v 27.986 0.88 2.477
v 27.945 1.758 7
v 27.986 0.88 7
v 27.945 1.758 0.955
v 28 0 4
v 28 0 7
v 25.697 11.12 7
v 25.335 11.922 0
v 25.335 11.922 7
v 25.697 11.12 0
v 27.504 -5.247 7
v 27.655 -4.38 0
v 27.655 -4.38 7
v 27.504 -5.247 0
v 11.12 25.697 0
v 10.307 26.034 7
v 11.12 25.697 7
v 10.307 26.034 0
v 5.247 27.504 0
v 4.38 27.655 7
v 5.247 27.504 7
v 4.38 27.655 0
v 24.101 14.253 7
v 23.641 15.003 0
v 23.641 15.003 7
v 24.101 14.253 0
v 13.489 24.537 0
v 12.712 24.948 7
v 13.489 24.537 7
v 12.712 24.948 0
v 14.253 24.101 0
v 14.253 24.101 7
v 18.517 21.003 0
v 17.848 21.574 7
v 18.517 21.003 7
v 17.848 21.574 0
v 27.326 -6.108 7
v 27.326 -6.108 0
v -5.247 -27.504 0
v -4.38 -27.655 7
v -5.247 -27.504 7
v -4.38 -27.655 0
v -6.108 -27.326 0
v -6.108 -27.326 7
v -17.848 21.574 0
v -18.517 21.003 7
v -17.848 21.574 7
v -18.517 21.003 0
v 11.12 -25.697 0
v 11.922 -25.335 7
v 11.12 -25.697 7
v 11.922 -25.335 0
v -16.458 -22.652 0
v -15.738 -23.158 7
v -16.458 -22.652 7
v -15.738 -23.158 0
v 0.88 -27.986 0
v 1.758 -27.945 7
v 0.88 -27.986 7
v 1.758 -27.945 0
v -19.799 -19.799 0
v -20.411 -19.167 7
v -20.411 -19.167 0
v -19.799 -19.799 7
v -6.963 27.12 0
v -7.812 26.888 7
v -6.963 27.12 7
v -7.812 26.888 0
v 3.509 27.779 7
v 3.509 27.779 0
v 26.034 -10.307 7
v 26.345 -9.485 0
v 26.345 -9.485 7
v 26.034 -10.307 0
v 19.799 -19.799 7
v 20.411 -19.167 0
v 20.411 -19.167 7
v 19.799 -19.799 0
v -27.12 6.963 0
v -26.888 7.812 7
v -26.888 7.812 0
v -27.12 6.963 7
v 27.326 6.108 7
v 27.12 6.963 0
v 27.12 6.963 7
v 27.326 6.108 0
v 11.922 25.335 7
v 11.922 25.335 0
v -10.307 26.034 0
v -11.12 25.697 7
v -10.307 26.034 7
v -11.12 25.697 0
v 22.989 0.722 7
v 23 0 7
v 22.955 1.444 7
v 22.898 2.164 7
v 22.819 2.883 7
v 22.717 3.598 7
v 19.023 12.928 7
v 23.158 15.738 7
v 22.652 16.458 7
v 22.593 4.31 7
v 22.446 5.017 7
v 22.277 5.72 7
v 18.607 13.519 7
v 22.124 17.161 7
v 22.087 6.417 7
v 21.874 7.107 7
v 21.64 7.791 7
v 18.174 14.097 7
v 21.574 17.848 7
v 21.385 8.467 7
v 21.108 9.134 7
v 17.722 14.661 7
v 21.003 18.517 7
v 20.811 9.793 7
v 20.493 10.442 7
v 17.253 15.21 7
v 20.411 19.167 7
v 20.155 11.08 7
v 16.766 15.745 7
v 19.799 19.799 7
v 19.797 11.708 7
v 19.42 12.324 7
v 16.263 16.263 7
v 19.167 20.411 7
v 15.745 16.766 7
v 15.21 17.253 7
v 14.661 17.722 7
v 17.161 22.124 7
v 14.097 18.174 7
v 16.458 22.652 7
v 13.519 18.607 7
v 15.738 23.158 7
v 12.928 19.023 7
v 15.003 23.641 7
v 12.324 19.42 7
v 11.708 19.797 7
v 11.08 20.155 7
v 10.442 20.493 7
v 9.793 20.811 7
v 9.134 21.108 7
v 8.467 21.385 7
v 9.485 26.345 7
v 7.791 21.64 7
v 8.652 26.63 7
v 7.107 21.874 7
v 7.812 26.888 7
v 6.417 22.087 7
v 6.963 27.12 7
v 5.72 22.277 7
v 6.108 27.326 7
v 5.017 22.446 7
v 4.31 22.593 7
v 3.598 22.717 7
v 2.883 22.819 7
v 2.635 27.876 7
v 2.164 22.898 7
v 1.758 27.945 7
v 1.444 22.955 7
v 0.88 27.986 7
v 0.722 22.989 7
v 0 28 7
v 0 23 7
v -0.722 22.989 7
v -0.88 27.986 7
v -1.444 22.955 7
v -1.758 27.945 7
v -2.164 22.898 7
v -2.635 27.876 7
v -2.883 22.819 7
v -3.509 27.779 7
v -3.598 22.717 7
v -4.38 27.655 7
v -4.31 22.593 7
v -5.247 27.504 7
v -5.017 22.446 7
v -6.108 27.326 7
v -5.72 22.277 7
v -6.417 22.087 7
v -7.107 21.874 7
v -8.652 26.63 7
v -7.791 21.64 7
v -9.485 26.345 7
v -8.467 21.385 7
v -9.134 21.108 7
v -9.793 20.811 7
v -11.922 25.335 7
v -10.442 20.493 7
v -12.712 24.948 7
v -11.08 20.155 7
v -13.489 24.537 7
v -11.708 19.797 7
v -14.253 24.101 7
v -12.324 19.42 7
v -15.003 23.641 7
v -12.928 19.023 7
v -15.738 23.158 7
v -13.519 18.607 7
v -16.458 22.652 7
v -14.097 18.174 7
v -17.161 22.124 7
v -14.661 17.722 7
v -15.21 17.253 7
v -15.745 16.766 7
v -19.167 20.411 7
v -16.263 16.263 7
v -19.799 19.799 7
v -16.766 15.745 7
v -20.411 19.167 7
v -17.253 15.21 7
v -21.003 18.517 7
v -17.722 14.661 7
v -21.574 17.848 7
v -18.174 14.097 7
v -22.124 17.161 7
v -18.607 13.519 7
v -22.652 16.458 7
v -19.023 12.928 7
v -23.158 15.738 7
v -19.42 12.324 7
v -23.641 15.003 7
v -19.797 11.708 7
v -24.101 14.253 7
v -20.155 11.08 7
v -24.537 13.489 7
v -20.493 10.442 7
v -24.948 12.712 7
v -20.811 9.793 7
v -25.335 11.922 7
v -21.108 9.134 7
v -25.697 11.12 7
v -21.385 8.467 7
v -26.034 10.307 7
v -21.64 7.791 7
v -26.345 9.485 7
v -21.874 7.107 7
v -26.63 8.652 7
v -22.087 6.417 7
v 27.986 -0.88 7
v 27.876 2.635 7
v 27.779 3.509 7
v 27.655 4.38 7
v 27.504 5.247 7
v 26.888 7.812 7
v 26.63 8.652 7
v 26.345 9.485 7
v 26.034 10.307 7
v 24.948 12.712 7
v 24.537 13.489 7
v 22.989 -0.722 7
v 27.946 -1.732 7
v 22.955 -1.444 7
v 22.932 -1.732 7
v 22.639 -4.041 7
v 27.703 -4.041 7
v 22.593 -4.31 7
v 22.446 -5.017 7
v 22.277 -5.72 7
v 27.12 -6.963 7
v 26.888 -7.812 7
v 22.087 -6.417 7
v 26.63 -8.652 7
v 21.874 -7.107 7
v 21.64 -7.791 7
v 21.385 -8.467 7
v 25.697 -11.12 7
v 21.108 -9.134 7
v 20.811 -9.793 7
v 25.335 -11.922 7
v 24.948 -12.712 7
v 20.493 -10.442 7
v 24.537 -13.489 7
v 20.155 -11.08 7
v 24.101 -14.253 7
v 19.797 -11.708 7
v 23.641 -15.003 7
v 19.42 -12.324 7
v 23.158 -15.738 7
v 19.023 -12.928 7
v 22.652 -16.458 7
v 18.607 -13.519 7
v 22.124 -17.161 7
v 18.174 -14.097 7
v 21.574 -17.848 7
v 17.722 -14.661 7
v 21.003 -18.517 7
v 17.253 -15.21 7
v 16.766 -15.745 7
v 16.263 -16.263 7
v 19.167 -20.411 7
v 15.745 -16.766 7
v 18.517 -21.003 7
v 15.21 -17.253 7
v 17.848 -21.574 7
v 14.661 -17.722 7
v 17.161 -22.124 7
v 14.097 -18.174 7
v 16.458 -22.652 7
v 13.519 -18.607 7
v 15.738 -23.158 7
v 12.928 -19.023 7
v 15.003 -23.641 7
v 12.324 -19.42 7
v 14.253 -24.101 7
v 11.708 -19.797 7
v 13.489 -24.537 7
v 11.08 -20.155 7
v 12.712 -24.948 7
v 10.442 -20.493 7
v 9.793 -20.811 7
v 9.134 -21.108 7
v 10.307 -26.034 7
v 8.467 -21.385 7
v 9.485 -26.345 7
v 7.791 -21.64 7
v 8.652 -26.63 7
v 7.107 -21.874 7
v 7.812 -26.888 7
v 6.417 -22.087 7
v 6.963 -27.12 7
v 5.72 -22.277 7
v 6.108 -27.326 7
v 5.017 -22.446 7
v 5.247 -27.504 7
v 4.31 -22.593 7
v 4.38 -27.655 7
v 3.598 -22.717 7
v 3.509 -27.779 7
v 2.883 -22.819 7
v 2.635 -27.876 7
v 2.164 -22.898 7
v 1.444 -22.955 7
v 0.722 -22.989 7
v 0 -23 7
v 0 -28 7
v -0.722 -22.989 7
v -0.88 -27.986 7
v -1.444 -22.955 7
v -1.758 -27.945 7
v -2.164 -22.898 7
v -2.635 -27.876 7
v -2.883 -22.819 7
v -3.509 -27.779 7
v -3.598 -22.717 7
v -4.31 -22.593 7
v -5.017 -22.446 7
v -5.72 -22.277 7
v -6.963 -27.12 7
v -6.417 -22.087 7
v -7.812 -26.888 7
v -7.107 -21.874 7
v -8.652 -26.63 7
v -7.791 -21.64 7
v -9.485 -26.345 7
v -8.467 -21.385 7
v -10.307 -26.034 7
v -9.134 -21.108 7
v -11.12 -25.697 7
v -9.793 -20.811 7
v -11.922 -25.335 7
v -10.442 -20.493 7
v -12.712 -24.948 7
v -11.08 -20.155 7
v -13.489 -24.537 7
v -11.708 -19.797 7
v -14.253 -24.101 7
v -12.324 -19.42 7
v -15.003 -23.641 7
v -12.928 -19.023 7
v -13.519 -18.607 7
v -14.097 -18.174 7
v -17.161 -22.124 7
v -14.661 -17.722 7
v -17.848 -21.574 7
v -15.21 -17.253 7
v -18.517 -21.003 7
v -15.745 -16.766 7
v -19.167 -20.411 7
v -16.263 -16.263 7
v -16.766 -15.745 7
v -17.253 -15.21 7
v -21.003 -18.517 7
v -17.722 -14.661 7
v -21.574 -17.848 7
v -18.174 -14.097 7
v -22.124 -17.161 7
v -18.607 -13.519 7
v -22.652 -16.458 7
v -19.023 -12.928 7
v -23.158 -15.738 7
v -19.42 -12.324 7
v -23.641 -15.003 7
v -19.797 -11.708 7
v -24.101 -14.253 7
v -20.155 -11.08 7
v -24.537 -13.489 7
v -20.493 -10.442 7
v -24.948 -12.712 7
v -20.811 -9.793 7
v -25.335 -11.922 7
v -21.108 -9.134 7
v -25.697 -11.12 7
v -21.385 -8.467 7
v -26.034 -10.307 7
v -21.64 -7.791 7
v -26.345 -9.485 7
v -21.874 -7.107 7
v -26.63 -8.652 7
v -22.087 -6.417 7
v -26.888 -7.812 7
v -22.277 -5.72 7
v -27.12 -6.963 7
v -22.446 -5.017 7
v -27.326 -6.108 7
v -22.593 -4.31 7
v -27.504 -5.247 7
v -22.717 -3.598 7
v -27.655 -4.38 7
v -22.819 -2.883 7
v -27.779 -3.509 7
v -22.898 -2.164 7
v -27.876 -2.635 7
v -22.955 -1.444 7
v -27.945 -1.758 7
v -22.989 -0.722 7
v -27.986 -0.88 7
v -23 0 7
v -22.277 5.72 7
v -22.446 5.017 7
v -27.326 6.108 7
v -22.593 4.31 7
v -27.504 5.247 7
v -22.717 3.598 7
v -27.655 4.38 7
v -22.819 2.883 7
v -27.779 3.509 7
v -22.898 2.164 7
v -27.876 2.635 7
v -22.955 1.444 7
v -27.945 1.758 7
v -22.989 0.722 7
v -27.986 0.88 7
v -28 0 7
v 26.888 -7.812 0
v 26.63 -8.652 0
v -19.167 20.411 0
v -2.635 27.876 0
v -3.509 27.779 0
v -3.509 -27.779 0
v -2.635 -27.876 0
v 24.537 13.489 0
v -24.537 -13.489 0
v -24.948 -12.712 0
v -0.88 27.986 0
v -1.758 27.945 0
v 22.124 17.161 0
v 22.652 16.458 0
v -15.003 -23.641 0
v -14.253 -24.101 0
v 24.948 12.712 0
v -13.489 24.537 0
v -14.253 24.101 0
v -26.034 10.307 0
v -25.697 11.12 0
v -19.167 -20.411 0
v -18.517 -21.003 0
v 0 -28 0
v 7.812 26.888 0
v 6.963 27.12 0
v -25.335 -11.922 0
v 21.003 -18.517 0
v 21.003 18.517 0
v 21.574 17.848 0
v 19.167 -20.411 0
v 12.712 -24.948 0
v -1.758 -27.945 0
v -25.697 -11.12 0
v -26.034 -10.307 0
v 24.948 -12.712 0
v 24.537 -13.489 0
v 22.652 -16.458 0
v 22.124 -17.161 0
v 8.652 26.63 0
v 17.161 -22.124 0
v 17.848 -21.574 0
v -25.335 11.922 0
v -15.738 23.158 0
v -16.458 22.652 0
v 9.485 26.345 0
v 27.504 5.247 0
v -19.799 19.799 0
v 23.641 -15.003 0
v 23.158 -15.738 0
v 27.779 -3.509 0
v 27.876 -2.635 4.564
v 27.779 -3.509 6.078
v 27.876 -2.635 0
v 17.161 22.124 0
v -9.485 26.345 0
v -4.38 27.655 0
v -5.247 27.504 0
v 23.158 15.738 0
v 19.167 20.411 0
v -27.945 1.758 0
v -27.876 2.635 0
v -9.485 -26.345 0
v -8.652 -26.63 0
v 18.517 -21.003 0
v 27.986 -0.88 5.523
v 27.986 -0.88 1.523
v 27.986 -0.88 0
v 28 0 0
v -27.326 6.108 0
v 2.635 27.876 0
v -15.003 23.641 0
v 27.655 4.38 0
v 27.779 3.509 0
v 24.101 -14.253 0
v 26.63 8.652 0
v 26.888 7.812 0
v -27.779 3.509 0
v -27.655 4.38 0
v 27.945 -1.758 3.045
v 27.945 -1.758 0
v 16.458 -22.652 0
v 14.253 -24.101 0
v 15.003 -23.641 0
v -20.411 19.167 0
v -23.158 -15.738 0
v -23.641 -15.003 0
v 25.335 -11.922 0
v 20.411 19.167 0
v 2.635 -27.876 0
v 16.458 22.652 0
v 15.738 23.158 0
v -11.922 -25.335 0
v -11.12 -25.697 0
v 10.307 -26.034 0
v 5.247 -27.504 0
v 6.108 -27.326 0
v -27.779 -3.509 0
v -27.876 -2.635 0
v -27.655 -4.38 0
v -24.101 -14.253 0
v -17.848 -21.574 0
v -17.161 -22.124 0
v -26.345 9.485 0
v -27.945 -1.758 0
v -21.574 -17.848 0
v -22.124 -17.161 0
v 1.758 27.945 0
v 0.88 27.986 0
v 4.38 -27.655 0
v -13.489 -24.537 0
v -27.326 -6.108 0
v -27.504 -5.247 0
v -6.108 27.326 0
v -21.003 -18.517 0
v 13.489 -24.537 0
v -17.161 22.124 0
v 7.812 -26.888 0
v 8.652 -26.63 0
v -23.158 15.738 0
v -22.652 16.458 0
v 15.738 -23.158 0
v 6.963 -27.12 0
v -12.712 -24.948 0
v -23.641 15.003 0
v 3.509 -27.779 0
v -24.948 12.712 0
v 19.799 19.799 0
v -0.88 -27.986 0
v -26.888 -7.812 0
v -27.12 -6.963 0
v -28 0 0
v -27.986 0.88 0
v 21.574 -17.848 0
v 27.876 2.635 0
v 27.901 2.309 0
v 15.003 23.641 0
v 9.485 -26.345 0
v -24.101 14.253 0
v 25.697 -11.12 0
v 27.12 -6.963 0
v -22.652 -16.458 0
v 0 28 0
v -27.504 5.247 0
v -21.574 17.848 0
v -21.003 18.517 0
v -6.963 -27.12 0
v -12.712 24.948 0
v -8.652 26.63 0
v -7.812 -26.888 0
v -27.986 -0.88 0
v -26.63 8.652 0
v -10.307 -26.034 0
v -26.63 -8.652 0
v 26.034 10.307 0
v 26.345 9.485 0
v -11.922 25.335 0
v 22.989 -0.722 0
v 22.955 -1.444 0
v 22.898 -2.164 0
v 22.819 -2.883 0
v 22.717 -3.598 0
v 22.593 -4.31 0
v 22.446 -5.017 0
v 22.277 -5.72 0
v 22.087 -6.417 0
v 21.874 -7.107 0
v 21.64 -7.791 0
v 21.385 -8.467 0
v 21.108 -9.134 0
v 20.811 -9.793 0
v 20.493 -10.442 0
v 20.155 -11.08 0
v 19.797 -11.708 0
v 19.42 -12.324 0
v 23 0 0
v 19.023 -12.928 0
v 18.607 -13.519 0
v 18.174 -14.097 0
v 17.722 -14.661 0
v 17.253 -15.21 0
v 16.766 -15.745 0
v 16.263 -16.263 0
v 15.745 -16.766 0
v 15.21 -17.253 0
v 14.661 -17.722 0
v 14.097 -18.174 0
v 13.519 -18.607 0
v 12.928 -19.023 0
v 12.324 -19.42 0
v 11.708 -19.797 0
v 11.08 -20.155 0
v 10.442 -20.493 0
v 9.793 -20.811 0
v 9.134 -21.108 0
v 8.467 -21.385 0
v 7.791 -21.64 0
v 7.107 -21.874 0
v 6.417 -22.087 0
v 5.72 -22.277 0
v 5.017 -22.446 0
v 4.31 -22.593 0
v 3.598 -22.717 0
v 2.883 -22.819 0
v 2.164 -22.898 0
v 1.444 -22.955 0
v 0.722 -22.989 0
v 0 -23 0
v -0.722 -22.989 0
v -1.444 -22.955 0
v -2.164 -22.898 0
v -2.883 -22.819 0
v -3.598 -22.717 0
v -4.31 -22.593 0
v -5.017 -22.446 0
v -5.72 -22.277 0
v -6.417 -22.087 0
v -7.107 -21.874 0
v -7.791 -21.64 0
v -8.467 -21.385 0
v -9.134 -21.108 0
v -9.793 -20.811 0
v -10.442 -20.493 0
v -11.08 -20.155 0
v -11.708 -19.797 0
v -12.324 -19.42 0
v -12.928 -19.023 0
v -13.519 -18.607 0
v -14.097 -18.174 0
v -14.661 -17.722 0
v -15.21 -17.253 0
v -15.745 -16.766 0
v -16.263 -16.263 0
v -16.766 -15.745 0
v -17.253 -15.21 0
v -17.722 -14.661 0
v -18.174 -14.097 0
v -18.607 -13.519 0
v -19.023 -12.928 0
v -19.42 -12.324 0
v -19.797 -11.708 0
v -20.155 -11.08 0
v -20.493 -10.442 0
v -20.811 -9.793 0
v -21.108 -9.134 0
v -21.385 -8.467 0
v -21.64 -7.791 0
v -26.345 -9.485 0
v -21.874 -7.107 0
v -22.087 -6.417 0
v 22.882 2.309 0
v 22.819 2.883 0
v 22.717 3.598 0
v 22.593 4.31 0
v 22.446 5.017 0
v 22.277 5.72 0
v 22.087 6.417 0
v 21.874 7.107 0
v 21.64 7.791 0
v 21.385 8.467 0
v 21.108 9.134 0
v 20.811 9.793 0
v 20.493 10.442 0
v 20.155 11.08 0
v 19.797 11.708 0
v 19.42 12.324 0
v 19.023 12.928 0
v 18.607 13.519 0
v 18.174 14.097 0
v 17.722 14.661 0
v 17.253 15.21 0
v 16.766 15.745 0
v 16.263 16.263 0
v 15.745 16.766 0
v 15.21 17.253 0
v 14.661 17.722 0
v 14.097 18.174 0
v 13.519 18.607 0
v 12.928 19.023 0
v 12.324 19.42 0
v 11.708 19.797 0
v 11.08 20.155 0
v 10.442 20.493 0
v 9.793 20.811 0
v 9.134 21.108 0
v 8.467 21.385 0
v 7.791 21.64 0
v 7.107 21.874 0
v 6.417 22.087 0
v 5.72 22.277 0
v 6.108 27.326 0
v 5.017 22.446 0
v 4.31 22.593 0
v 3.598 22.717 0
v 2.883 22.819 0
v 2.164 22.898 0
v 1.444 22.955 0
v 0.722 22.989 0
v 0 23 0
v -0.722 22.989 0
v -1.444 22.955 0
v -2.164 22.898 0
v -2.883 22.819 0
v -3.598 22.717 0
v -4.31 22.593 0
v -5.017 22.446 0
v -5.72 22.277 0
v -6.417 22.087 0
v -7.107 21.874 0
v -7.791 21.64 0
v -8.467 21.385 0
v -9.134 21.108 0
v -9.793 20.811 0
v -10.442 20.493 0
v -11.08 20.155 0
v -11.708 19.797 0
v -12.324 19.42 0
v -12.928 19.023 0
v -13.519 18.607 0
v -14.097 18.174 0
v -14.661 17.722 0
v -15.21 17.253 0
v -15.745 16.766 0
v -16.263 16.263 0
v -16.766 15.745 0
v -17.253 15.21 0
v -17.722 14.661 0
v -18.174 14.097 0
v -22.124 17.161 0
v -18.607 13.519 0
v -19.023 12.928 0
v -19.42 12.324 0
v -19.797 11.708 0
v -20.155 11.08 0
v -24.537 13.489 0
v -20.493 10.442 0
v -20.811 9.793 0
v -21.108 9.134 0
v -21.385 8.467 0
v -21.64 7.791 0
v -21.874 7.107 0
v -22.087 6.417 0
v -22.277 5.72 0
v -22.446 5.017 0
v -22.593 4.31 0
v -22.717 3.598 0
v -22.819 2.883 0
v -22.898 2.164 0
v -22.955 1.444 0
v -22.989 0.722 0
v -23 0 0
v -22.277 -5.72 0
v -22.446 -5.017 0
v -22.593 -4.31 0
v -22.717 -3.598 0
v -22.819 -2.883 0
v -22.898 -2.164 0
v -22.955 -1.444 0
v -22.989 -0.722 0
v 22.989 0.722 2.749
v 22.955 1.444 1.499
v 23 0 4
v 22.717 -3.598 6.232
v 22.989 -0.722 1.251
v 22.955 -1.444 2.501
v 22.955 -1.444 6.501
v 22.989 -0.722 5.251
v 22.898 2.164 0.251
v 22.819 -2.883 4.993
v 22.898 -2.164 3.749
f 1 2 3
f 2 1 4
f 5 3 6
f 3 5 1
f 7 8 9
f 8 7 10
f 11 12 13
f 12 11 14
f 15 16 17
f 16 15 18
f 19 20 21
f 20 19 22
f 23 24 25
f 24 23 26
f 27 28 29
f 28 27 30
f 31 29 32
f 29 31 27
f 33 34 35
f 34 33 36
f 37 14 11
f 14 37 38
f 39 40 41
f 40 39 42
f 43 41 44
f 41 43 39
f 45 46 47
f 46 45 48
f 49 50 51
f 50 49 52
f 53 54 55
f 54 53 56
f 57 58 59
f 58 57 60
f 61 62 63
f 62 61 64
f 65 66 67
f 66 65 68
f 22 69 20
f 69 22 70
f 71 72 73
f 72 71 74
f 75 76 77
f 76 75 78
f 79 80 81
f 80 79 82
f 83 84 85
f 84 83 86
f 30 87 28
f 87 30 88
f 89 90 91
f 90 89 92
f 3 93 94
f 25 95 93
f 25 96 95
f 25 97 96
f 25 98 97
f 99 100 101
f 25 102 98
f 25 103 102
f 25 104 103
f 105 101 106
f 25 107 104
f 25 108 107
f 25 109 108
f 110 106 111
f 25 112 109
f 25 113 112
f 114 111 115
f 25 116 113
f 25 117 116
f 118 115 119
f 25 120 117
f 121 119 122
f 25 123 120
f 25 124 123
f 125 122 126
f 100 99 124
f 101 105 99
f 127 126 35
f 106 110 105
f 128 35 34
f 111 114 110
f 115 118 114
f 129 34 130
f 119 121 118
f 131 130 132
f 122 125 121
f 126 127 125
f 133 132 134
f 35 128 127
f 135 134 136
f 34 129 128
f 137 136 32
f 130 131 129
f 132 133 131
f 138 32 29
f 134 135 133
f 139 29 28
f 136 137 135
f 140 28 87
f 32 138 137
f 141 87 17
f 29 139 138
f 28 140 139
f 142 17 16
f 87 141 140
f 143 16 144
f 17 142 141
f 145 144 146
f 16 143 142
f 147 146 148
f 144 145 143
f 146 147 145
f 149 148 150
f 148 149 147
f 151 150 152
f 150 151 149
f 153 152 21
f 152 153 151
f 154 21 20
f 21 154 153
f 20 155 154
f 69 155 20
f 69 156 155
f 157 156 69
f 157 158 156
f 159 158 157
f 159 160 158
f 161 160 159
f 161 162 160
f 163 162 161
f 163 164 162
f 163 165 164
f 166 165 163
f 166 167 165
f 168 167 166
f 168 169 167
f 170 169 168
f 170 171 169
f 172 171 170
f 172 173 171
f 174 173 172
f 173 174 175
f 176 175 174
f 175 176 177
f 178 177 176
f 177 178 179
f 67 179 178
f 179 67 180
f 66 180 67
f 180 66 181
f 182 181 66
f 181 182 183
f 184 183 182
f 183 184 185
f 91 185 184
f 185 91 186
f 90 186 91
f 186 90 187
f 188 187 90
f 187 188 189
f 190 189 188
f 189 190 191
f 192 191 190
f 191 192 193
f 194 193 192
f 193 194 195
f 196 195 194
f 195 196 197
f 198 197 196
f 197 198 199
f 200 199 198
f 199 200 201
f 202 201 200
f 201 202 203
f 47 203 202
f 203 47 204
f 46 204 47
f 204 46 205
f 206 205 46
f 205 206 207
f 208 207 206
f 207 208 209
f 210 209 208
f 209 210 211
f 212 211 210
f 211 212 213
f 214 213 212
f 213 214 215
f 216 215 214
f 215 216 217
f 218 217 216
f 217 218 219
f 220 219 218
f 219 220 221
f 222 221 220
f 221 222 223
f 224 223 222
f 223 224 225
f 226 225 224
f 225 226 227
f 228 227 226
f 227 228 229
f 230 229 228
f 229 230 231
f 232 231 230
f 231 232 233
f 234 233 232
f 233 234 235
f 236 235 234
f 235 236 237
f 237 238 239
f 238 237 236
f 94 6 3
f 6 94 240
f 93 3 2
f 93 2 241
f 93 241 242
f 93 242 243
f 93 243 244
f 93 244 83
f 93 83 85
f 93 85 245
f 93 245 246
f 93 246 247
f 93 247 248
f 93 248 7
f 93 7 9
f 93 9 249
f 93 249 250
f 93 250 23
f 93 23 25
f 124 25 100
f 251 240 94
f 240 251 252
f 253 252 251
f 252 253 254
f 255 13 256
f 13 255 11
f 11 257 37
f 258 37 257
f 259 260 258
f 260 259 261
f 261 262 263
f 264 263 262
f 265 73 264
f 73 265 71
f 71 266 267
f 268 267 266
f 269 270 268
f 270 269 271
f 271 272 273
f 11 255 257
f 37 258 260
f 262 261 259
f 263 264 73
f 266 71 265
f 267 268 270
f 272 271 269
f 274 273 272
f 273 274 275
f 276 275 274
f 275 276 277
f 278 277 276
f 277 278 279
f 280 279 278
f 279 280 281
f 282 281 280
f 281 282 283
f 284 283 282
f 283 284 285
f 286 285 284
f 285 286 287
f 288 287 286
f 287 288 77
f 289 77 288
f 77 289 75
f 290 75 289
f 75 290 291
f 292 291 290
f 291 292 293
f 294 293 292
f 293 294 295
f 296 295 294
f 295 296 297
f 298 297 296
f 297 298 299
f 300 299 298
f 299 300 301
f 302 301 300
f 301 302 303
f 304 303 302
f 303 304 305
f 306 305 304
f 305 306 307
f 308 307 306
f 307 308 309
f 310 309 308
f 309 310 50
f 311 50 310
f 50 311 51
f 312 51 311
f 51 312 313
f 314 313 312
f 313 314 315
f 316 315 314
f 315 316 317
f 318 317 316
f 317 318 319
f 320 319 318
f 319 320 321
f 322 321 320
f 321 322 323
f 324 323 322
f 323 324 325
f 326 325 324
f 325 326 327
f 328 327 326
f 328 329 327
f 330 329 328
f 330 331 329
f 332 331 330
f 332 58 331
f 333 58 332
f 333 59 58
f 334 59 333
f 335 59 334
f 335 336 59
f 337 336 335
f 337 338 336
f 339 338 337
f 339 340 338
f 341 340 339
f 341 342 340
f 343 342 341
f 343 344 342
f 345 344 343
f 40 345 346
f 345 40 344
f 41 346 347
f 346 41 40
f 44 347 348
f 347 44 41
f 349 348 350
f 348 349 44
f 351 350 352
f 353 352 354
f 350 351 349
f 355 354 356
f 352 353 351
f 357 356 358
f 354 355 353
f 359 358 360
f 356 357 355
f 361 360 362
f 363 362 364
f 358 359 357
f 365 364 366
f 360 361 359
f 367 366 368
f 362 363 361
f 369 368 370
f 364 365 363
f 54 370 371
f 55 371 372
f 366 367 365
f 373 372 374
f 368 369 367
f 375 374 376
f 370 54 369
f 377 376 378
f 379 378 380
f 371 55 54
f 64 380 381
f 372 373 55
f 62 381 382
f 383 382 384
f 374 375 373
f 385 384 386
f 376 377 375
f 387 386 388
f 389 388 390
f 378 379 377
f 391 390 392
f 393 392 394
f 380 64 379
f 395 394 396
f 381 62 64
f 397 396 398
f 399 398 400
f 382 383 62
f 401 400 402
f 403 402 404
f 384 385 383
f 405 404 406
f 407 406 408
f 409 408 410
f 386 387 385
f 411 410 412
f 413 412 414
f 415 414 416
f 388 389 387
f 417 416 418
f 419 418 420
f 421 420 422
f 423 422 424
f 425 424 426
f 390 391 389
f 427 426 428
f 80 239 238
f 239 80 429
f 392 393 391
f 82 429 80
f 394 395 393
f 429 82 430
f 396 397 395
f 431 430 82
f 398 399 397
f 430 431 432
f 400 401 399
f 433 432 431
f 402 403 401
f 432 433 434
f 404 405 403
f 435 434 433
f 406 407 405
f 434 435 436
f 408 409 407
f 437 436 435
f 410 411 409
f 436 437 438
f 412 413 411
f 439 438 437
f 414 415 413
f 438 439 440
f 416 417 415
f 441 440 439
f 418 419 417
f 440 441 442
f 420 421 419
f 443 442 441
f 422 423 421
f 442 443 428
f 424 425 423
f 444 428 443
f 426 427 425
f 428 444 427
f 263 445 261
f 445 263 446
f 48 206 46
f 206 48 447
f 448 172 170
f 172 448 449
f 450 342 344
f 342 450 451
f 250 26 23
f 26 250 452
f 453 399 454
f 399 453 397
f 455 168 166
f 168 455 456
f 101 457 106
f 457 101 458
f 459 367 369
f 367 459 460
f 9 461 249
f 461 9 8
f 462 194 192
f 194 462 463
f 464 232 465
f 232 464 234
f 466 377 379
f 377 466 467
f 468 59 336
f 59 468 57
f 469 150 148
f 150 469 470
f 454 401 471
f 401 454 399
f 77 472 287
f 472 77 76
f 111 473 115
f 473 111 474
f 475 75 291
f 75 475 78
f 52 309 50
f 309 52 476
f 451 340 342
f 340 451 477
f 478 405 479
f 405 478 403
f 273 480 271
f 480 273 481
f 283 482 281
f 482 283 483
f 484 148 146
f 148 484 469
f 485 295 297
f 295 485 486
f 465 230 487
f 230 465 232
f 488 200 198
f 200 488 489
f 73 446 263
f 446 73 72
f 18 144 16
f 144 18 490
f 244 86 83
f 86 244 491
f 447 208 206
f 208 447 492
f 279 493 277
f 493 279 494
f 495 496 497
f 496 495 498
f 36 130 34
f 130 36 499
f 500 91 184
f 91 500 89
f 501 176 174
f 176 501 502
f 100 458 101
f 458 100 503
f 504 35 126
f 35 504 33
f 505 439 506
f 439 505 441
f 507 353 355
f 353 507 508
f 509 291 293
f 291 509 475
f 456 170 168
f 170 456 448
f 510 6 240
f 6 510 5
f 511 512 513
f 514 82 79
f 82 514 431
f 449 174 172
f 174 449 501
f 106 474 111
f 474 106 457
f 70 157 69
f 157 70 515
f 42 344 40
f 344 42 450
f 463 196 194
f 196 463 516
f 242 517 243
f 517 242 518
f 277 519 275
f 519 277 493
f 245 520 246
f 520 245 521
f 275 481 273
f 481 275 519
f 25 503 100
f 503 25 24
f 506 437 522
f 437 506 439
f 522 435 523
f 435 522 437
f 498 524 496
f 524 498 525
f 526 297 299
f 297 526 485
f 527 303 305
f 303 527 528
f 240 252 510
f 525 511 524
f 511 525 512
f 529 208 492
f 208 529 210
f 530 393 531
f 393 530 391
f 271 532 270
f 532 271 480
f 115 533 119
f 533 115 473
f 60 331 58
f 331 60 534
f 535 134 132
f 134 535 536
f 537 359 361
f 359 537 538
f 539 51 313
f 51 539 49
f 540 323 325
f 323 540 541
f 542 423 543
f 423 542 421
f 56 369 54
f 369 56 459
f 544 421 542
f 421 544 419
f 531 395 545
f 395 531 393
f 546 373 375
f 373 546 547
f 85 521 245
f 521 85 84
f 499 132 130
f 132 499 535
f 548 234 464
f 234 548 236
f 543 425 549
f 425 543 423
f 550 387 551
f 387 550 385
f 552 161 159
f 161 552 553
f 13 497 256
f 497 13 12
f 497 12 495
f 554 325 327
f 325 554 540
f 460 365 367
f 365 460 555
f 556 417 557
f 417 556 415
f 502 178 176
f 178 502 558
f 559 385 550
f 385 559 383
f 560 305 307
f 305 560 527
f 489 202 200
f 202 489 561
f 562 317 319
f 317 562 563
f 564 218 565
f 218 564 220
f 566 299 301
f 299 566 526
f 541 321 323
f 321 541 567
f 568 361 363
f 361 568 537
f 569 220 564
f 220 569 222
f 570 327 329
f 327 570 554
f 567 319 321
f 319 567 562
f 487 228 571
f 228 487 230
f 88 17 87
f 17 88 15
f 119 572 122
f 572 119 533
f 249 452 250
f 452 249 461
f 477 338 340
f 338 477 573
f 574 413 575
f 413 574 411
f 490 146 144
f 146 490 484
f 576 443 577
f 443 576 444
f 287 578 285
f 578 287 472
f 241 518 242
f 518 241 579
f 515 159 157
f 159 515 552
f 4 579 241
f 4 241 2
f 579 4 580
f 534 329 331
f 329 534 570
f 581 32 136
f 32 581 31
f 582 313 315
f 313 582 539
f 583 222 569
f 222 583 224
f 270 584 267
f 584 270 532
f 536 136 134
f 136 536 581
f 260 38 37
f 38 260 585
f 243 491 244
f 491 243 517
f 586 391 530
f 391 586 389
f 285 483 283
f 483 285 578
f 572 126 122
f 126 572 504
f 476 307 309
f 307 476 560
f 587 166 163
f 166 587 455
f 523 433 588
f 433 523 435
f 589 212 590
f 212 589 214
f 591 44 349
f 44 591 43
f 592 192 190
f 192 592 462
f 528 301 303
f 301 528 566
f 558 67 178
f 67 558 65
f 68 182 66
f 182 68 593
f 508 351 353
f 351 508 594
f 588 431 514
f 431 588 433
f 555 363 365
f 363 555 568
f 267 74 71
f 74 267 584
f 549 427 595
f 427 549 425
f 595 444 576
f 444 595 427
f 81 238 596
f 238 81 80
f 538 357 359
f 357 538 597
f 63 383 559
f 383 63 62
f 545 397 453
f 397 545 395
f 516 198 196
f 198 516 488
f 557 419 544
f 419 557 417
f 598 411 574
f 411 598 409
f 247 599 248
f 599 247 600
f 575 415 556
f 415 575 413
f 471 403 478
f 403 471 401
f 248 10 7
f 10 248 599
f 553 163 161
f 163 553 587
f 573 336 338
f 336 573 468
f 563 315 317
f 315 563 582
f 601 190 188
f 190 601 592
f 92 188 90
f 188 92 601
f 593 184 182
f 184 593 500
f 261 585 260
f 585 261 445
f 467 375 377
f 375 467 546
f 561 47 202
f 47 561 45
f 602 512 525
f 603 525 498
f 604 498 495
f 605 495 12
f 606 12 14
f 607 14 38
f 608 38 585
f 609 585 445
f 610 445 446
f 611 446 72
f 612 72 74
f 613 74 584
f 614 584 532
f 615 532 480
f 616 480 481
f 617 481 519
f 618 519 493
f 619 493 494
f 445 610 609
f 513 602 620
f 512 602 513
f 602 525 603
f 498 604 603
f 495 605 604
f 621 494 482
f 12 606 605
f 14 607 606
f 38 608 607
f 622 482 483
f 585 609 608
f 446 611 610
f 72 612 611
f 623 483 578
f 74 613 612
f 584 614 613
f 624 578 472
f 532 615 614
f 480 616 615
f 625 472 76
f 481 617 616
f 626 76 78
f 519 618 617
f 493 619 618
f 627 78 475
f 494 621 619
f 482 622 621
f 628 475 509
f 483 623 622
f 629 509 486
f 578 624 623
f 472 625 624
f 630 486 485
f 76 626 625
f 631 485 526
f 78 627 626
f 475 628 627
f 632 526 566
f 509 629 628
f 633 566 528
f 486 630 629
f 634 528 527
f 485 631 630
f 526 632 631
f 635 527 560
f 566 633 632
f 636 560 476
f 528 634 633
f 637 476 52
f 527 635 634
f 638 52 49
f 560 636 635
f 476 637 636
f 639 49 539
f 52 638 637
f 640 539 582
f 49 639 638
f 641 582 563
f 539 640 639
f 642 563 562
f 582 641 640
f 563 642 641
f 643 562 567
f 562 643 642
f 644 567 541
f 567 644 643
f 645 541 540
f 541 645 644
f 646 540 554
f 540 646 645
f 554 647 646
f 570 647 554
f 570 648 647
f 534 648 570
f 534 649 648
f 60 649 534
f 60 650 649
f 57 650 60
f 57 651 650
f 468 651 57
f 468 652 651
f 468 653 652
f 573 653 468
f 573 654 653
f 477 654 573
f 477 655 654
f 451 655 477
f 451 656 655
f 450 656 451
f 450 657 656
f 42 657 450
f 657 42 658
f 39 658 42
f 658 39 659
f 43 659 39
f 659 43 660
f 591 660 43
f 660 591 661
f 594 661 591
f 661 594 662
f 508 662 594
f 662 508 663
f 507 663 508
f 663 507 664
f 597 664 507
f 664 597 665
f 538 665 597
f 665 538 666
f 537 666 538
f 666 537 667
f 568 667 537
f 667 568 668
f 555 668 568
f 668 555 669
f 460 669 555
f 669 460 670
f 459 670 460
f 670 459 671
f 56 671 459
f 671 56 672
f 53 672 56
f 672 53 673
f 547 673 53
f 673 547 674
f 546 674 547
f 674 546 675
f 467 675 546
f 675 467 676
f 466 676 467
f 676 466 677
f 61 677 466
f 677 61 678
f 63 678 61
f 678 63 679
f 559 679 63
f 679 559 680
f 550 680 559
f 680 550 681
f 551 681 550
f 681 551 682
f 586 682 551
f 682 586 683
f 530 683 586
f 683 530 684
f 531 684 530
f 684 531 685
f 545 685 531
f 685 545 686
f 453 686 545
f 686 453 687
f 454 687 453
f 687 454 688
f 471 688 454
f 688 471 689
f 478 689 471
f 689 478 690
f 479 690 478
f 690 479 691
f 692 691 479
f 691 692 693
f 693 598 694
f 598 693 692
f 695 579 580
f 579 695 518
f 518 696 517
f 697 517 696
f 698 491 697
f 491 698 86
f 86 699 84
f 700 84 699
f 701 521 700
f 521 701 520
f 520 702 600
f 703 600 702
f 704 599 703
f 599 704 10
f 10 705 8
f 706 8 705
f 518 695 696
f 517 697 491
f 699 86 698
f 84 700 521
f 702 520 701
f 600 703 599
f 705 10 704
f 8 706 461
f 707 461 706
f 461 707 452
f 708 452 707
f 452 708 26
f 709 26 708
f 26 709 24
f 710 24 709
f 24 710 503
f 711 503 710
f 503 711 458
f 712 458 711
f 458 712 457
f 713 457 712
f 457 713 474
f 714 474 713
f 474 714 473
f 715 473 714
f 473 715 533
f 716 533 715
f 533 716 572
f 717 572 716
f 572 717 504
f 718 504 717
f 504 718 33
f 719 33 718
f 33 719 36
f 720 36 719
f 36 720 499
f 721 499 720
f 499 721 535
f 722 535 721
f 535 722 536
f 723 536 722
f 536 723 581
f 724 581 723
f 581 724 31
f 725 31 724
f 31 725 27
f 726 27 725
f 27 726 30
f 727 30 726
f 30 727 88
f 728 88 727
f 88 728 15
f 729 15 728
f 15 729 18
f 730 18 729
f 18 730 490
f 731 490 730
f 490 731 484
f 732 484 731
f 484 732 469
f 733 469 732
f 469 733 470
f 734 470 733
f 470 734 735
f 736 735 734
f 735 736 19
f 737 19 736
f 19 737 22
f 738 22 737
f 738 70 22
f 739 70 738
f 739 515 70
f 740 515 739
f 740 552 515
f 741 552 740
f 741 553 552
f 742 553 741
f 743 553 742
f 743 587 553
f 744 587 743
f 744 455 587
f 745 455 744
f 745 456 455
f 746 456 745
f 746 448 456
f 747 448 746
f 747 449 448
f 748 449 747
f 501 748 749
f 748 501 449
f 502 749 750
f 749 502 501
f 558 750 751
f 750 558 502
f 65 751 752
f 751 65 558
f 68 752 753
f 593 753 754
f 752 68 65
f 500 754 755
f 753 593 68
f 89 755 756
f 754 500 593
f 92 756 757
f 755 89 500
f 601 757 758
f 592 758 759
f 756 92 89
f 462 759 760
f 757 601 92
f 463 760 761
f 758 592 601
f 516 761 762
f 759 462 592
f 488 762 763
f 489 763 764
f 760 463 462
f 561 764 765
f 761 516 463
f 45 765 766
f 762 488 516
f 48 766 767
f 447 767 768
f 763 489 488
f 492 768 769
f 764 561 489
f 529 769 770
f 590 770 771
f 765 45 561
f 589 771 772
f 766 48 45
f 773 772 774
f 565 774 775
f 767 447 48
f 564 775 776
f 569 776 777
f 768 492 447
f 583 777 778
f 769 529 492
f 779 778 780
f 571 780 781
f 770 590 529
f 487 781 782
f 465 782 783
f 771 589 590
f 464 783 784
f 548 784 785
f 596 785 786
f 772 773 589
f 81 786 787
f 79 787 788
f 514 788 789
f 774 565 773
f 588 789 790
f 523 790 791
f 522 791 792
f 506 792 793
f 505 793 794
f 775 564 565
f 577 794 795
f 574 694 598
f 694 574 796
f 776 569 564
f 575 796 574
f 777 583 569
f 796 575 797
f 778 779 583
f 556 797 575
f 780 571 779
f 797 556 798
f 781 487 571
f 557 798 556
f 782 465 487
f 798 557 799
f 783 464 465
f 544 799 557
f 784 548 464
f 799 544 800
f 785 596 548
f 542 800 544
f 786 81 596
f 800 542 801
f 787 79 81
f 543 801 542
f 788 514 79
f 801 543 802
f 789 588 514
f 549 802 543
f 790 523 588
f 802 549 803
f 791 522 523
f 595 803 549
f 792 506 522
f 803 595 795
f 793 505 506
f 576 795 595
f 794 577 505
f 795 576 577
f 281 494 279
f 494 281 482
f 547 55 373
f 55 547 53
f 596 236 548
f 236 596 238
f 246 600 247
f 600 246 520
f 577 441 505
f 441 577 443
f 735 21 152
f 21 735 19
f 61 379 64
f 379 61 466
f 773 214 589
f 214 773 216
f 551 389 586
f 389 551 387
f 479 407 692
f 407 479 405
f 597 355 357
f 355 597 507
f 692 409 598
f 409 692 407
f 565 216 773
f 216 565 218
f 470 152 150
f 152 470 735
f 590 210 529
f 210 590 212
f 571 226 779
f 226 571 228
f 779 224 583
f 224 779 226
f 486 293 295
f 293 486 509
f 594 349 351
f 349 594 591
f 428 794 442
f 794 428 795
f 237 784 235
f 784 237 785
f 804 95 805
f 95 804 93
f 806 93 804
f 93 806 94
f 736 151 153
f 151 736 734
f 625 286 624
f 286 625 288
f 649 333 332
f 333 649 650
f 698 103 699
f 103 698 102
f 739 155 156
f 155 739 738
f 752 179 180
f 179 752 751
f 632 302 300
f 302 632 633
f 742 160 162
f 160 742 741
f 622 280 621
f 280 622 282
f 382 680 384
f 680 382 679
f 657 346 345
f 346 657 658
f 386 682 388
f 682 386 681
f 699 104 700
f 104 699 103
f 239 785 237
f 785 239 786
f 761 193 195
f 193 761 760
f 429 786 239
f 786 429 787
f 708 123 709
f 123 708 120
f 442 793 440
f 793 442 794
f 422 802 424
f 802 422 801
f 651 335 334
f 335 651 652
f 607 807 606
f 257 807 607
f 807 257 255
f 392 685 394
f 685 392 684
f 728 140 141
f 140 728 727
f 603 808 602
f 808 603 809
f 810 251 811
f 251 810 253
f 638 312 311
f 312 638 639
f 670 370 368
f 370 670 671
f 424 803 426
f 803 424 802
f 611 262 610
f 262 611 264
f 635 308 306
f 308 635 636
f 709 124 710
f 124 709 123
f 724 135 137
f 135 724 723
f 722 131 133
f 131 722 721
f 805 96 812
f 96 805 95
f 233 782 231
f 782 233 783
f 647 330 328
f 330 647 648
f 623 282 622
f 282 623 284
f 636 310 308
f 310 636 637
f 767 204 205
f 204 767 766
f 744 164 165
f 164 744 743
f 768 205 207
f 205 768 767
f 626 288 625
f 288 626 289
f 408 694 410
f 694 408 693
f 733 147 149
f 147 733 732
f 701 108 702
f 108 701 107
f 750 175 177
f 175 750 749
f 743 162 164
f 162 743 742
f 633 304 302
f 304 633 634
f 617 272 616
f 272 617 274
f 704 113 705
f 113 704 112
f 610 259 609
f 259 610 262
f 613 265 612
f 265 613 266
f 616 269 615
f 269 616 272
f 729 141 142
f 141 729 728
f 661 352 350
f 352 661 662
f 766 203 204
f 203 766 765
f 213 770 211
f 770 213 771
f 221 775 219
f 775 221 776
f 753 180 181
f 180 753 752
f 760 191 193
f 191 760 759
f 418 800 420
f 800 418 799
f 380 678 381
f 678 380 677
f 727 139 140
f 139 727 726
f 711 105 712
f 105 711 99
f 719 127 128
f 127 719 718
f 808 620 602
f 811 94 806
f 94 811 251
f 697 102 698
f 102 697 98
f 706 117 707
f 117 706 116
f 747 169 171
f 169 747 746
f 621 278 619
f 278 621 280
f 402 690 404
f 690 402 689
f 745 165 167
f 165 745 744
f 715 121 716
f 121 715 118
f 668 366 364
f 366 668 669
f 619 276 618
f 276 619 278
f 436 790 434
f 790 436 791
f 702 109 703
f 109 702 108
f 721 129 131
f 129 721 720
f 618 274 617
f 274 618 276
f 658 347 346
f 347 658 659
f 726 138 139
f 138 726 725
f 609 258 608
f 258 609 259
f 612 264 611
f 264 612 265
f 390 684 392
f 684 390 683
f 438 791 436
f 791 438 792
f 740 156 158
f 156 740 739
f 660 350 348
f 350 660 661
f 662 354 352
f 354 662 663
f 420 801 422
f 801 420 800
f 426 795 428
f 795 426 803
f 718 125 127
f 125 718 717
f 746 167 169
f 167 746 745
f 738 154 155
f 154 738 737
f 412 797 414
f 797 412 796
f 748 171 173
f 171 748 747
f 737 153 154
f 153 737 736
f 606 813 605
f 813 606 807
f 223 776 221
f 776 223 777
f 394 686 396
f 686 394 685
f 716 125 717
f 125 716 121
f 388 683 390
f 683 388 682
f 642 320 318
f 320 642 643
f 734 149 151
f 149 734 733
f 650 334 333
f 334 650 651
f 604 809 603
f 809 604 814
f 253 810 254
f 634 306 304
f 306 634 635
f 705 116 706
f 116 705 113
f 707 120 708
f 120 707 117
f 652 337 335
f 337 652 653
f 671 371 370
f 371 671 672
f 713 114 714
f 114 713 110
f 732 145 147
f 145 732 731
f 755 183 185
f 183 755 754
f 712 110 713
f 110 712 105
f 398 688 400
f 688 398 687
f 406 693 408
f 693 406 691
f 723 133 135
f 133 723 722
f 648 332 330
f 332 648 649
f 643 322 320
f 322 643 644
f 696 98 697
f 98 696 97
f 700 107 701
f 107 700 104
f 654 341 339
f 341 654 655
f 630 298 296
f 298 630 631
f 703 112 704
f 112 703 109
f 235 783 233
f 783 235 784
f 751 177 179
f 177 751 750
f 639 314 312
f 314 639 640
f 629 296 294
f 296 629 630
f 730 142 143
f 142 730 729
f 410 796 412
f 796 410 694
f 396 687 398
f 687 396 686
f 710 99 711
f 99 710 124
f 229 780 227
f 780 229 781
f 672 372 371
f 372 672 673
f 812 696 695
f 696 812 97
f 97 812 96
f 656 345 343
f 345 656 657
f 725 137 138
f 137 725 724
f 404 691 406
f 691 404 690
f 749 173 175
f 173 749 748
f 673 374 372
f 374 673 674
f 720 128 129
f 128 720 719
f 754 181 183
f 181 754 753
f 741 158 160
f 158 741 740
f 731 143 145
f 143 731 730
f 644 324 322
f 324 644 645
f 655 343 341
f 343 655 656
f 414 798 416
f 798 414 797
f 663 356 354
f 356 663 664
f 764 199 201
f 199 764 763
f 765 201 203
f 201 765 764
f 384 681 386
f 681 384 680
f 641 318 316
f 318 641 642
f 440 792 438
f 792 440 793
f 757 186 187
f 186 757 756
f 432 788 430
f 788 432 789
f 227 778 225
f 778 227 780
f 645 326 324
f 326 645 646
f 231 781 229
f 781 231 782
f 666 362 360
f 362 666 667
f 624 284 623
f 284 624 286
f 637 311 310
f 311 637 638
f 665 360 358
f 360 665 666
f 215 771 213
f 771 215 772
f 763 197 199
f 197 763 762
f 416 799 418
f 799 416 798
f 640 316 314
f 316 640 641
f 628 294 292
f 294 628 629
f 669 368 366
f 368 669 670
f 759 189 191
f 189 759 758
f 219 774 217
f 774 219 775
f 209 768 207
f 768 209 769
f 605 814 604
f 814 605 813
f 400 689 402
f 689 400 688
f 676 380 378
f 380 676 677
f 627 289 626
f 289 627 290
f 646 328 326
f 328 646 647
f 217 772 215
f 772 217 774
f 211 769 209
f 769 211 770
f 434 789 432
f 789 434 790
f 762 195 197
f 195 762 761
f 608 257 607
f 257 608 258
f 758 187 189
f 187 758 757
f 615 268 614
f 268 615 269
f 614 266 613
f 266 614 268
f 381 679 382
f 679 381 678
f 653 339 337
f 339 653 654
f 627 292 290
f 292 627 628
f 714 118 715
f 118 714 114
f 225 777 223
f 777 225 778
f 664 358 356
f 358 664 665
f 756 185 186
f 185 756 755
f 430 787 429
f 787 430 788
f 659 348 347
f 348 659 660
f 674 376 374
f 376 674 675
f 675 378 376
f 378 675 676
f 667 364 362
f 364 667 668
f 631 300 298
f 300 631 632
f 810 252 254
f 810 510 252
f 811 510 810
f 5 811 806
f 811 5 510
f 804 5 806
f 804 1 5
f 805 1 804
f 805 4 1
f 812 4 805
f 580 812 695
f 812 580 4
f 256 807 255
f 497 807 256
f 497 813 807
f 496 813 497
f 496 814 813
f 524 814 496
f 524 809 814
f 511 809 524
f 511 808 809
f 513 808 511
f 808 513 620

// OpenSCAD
// Rolling Pin Spacers
// all measurements are in mm

// Diameter of rolling pin in mm (best if slightly smaller than actual)
pin = 46;
pinr=pin/2;

// How thick you want the dough to be in mm
Dough = 5;

difference () {
   cylinder (h=7,r=pinr+Dough, $fn = 200);
   translate ([0,0,-2]) cylinder (h=14,r=pinr, $fn = 200);
   rotate([30,0,0]) translate ([0,0,-5]) cube([pinr+Dough+2,2,20]);;
}
